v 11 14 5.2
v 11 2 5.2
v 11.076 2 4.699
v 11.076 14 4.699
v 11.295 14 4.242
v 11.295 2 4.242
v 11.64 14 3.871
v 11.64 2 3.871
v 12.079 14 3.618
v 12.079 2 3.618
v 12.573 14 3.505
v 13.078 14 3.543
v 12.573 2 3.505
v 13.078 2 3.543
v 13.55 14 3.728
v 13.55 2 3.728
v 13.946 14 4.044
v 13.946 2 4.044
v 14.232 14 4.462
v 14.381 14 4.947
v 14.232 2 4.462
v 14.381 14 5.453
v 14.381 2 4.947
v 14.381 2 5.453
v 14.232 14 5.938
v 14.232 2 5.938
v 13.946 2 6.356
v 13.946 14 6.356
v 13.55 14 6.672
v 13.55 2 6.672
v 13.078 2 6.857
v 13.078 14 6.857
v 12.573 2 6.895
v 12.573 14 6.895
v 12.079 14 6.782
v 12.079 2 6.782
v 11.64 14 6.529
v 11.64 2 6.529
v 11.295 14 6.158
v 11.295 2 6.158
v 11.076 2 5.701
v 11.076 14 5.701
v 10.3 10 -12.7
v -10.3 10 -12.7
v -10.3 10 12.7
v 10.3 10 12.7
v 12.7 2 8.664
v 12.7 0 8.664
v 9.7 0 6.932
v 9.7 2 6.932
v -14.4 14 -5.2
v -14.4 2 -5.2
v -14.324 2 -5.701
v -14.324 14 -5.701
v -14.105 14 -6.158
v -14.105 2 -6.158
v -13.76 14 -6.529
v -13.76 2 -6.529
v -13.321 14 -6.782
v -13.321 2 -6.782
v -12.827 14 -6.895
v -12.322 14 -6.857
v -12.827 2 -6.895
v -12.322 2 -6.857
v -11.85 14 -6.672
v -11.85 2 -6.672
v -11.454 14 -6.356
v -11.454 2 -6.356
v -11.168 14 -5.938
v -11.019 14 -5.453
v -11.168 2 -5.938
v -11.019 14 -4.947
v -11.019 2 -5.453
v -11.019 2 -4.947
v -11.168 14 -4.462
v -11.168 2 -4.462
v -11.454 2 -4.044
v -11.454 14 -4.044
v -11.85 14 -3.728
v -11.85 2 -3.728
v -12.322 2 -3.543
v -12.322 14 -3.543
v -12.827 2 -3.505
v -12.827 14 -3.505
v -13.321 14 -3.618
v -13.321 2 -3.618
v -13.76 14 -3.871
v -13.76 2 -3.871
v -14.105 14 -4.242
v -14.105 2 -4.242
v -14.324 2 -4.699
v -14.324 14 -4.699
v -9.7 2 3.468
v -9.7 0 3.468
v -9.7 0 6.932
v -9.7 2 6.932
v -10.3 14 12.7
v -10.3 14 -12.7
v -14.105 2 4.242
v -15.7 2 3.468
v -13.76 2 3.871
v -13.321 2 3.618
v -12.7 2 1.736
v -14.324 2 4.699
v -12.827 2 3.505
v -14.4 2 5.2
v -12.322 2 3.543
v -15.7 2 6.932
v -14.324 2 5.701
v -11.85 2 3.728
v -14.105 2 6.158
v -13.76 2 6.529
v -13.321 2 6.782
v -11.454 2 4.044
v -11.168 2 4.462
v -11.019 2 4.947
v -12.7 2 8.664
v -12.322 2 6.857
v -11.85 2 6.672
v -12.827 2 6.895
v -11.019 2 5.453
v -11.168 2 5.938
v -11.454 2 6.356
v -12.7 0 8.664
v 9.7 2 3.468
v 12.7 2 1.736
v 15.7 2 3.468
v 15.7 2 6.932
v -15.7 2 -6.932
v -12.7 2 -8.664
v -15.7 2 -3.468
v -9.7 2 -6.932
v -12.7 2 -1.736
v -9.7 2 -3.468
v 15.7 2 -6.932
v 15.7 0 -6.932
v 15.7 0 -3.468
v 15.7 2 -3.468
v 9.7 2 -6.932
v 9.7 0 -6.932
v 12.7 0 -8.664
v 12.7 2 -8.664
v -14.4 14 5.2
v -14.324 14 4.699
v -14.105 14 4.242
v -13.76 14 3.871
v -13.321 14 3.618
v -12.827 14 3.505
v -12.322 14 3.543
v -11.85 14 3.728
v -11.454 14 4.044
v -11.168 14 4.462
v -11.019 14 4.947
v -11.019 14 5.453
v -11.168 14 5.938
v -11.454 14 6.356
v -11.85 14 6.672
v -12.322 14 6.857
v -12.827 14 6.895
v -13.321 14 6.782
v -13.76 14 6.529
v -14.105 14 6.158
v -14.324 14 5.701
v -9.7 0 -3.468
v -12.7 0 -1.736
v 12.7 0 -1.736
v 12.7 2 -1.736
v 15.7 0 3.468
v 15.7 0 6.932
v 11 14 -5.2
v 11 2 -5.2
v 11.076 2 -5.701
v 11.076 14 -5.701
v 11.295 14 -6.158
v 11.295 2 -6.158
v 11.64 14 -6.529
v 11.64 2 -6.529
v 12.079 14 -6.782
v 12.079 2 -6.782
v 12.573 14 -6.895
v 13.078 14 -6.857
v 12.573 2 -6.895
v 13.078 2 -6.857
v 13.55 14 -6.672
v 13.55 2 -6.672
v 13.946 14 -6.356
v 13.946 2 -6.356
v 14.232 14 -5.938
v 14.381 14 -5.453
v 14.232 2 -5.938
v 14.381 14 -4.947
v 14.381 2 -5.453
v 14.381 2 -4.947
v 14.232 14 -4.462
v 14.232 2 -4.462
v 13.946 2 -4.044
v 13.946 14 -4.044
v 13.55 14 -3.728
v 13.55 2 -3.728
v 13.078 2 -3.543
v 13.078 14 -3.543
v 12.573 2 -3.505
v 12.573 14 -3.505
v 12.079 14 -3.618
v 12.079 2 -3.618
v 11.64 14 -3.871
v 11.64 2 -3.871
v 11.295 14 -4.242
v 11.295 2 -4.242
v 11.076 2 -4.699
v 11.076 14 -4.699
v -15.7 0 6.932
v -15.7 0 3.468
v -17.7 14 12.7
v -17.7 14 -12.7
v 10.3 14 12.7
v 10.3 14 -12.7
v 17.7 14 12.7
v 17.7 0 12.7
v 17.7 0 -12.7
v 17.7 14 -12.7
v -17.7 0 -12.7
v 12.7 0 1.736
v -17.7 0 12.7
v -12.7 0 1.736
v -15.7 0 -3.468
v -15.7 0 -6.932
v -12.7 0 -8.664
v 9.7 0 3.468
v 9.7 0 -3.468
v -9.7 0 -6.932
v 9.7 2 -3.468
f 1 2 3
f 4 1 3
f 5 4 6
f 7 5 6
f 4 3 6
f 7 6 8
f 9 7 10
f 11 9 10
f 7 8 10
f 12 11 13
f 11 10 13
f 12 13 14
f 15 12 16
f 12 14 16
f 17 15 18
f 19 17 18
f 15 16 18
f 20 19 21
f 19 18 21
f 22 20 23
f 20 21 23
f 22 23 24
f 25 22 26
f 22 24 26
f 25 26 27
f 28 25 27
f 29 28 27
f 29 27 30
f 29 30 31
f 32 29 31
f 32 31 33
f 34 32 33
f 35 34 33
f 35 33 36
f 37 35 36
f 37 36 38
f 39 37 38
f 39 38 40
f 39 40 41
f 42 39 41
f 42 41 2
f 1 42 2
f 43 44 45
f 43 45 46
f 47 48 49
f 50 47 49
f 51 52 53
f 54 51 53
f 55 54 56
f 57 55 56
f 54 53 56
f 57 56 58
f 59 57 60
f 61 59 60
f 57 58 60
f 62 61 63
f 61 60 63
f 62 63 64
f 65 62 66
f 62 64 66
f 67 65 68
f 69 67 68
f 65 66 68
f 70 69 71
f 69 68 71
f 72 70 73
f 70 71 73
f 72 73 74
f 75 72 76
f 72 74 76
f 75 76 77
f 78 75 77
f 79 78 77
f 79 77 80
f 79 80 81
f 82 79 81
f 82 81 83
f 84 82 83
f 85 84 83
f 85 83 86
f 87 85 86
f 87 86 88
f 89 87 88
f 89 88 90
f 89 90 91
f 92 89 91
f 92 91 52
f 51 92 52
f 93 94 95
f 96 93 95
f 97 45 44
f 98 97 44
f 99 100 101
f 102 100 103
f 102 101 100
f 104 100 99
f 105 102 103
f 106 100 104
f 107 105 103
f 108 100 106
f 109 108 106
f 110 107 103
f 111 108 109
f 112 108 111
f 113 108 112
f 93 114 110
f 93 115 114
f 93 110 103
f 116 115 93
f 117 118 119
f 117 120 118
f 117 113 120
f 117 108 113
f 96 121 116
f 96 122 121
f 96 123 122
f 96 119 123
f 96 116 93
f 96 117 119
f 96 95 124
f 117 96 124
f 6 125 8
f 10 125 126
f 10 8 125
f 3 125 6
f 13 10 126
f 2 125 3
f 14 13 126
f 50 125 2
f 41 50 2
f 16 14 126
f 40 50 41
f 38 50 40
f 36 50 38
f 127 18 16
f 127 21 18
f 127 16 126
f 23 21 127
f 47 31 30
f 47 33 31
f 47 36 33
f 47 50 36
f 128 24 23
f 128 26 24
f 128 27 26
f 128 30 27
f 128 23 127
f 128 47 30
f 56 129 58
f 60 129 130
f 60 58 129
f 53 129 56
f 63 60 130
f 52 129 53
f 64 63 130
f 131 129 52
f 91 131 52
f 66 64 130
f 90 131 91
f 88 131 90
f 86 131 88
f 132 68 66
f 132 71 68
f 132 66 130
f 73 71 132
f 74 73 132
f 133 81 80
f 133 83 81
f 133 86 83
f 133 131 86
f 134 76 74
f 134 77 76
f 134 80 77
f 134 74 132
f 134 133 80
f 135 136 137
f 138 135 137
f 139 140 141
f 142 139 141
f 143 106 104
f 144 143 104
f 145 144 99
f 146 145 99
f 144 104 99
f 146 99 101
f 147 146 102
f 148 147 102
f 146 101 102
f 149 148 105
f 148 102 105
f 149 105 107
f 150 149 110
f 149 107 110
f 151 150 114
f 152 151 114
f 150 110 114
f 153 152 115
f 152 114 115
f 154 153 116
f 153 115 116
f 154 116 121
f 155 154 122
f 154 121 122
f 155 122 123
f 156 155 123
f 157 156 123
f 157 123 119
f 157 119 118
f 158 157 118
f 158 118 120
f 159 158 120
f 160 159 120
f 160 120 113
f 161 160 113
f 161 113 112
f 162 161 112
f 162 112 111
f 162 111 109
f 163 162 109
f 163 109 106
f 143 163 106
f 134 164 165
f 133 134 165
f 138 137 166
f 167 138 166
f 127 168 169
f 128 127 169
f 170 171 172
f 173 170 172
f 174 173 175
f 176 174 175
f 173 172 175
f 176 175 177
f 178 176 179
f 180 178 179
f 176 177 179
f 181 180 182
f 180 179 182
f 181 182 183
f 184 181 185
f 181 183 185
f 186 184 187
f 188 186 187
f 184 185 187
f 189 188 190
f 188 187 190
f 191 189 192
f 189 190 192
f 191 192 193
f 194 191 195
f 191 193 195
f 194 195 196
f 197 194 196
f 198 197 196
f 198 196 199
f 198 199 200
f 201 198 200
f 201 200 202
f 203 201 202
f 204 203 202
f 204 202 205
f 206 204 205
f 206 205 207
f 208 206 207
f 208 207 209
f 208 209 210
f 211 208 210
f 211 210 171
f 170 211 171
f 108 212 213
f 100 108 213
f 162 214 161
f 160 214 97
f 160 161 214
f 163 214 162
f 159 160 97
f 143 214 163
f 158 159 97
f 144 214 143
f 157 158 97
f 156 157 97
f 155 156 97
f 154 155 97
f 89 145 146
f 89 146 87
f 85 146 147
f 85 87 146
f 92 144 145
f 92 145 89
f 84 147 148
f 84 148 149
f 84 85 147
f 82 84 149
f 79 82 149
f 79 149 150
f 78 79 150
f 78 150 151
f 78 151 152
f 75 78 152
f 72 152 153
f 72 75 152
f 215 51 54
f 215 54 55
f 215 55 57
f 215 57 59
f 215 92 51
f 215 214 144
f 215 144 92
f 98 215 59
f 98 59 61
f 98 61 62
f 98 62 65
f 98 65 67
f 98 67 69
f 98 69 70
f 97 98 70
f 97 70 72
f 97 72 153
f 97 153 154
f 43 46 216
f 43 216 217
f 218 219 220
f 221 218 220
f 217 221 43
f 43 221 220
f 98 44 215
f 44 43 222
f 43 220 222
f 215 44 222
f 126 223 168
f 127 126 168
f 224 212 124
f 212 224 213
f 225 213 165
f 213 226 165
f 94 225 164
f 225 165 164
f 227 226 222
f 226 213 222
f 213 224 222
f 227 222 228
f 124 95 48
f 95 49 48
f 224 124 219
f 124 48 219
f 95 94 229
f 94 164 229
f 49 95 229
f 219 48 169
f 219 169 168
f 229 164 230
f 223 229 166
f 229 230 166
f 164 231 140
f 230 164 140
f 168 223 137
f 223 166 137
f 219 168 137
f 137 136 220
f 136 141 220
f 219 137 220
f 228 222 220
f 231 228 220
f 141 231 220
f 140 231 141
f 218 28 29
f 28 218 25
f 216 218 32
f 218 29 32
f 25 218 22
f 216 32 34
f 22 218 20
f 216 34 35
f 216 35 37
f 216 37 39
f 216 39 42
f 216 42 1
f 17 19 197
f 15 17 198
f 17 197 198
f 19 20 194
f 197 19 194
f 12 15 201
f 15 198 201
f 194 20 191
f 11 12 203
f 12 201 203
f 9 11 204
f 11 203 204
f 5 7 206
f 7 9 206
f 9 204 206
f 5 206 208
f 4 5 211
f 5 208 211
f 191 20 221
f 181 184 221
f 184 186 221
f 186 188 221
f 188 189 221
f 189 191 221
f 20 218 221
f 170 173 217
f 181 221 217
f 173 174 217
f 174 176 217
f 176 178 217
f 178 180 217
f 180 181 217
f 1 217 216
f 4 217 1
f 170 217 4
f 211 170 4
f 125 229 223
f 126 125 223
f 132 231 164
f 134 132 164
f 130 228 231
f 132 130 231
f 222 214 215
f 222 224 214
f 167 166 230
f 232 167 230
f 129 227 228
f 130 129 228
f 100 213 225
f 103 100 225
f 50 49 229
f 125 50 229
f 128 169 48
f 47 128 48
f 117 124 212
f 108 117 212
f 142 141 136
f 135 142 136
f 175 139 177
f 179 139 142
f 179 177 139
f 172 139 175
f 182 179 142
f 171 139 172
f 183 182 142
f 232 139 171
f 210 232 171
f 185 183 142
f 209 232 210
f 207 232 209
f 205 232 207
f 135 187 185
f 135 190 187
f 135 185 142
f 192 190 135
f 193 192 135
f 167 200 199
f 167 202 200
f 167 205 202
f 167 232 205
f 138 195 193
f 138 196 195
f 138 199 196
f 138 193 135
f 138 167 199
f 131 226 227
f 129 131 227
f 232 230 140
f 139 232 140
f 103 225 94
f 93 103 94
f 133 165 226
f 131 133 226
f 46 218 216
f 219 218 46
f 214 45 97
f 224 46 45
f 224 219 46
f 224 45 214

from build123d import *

# Parameters (mm, degrees)
CROQUIS1_W                   = 35.4
CROQUIS1_H                   = 25.4
SALIENTE_EXTRUIR1_DEPTH      = 10
CROQUIS2_W                   = 7.4
CROQUIS2_H                   = 25.4
SALIENTE_EXTRUIR2_DEPTH      = 4
TALADRO_DE_MARGEN_PARA_M31_D = 3.4
CORTAR_EXTRUIR1_DEPTH        = 2
MATRIZL2_COUNT               = 2
MATRIZL2_PITCH               = 25.4
MATRIZL2_COUNT_DIR2          = 2
MATRIZL2_PITCH_DIR2          = 10.4


with BuildPart() as part:
    # Croquis1 → Saliente-Extruir1 (new body)
    with BuildSketch(Plane(origin=(0, 0, 0), x_dir=(1, 0, 0), z_dir=(0, 1, 0))):
        Rectangle(CROQUIS1_W, CROQUIS1_H)
    extrude(amount=SALIENTE_EXTRUIR1_DEPTH)

    # Croquis2 → Saliente-Extruir2 (add)
    with BuildSketch(Plane(origin=(0, 10, 0), x_dir=(1, 0, 0), z_dir=(0, 1, 0))):
        with Locations((-14, 0)):
            Rectangle(CROQUIS2_W, CROQUIS2_H)
    saliente_extruir2 = extrude(amount=SALIENTE_EXTRUIR2_DEPTH)

    # Simetría1: Saliente-Extruir2 across plane
    add(saliente_extruir2.mirror(Plane(origin=(0, 0, 0), x_dir=(0, 0, 1), z_dir=(1, 0, 0))))

    # Taladro de margen para M31 (through all)
    with Locations(Plane(origin=(0, 14, 0), x_dir=(1, 0, 0), z_dir=(0, 1, 0))):
        with Locations((-12.7, 5.2), (12.7, -5.2), (12.7, 5.2), (-12.7, -5.2)):
            Hole(TALADRO_DE_MARGEN_PARA_M31_D / 2)

    # Croquis6 → Cortar-Extruir1 (cut)
    with BuildSketch(Plane.XZ):
        Polygon((-9.7, 6.932050808), (-12.7, 8.664101615), (-15.7, 6.932050808), (-15.7, 3.467949192), (-12.7, 1.735898385), (-9.7, 3.467949192), align=None)
    cortar_extruir1 = extrude(amount=-CORTAR_EXTRUIR1_DEPTH, mode=Mode.SUBTRACT)

    # MatrizL2: Cortar-Extruir1 2 × 2
    with Locations(*[(i * MATRIZL2_PITCH, 0, -j * MATRIZL2_PITCH_DIR2) for i in range(MATRIZL2_COUNT) for j in range(MATRIZL2_COUNT_DIR2) if (i, j) != (0, 0)]):
        add(cortar_extruir1, mode=Mode.SUBTRACT)


solid = part.part
